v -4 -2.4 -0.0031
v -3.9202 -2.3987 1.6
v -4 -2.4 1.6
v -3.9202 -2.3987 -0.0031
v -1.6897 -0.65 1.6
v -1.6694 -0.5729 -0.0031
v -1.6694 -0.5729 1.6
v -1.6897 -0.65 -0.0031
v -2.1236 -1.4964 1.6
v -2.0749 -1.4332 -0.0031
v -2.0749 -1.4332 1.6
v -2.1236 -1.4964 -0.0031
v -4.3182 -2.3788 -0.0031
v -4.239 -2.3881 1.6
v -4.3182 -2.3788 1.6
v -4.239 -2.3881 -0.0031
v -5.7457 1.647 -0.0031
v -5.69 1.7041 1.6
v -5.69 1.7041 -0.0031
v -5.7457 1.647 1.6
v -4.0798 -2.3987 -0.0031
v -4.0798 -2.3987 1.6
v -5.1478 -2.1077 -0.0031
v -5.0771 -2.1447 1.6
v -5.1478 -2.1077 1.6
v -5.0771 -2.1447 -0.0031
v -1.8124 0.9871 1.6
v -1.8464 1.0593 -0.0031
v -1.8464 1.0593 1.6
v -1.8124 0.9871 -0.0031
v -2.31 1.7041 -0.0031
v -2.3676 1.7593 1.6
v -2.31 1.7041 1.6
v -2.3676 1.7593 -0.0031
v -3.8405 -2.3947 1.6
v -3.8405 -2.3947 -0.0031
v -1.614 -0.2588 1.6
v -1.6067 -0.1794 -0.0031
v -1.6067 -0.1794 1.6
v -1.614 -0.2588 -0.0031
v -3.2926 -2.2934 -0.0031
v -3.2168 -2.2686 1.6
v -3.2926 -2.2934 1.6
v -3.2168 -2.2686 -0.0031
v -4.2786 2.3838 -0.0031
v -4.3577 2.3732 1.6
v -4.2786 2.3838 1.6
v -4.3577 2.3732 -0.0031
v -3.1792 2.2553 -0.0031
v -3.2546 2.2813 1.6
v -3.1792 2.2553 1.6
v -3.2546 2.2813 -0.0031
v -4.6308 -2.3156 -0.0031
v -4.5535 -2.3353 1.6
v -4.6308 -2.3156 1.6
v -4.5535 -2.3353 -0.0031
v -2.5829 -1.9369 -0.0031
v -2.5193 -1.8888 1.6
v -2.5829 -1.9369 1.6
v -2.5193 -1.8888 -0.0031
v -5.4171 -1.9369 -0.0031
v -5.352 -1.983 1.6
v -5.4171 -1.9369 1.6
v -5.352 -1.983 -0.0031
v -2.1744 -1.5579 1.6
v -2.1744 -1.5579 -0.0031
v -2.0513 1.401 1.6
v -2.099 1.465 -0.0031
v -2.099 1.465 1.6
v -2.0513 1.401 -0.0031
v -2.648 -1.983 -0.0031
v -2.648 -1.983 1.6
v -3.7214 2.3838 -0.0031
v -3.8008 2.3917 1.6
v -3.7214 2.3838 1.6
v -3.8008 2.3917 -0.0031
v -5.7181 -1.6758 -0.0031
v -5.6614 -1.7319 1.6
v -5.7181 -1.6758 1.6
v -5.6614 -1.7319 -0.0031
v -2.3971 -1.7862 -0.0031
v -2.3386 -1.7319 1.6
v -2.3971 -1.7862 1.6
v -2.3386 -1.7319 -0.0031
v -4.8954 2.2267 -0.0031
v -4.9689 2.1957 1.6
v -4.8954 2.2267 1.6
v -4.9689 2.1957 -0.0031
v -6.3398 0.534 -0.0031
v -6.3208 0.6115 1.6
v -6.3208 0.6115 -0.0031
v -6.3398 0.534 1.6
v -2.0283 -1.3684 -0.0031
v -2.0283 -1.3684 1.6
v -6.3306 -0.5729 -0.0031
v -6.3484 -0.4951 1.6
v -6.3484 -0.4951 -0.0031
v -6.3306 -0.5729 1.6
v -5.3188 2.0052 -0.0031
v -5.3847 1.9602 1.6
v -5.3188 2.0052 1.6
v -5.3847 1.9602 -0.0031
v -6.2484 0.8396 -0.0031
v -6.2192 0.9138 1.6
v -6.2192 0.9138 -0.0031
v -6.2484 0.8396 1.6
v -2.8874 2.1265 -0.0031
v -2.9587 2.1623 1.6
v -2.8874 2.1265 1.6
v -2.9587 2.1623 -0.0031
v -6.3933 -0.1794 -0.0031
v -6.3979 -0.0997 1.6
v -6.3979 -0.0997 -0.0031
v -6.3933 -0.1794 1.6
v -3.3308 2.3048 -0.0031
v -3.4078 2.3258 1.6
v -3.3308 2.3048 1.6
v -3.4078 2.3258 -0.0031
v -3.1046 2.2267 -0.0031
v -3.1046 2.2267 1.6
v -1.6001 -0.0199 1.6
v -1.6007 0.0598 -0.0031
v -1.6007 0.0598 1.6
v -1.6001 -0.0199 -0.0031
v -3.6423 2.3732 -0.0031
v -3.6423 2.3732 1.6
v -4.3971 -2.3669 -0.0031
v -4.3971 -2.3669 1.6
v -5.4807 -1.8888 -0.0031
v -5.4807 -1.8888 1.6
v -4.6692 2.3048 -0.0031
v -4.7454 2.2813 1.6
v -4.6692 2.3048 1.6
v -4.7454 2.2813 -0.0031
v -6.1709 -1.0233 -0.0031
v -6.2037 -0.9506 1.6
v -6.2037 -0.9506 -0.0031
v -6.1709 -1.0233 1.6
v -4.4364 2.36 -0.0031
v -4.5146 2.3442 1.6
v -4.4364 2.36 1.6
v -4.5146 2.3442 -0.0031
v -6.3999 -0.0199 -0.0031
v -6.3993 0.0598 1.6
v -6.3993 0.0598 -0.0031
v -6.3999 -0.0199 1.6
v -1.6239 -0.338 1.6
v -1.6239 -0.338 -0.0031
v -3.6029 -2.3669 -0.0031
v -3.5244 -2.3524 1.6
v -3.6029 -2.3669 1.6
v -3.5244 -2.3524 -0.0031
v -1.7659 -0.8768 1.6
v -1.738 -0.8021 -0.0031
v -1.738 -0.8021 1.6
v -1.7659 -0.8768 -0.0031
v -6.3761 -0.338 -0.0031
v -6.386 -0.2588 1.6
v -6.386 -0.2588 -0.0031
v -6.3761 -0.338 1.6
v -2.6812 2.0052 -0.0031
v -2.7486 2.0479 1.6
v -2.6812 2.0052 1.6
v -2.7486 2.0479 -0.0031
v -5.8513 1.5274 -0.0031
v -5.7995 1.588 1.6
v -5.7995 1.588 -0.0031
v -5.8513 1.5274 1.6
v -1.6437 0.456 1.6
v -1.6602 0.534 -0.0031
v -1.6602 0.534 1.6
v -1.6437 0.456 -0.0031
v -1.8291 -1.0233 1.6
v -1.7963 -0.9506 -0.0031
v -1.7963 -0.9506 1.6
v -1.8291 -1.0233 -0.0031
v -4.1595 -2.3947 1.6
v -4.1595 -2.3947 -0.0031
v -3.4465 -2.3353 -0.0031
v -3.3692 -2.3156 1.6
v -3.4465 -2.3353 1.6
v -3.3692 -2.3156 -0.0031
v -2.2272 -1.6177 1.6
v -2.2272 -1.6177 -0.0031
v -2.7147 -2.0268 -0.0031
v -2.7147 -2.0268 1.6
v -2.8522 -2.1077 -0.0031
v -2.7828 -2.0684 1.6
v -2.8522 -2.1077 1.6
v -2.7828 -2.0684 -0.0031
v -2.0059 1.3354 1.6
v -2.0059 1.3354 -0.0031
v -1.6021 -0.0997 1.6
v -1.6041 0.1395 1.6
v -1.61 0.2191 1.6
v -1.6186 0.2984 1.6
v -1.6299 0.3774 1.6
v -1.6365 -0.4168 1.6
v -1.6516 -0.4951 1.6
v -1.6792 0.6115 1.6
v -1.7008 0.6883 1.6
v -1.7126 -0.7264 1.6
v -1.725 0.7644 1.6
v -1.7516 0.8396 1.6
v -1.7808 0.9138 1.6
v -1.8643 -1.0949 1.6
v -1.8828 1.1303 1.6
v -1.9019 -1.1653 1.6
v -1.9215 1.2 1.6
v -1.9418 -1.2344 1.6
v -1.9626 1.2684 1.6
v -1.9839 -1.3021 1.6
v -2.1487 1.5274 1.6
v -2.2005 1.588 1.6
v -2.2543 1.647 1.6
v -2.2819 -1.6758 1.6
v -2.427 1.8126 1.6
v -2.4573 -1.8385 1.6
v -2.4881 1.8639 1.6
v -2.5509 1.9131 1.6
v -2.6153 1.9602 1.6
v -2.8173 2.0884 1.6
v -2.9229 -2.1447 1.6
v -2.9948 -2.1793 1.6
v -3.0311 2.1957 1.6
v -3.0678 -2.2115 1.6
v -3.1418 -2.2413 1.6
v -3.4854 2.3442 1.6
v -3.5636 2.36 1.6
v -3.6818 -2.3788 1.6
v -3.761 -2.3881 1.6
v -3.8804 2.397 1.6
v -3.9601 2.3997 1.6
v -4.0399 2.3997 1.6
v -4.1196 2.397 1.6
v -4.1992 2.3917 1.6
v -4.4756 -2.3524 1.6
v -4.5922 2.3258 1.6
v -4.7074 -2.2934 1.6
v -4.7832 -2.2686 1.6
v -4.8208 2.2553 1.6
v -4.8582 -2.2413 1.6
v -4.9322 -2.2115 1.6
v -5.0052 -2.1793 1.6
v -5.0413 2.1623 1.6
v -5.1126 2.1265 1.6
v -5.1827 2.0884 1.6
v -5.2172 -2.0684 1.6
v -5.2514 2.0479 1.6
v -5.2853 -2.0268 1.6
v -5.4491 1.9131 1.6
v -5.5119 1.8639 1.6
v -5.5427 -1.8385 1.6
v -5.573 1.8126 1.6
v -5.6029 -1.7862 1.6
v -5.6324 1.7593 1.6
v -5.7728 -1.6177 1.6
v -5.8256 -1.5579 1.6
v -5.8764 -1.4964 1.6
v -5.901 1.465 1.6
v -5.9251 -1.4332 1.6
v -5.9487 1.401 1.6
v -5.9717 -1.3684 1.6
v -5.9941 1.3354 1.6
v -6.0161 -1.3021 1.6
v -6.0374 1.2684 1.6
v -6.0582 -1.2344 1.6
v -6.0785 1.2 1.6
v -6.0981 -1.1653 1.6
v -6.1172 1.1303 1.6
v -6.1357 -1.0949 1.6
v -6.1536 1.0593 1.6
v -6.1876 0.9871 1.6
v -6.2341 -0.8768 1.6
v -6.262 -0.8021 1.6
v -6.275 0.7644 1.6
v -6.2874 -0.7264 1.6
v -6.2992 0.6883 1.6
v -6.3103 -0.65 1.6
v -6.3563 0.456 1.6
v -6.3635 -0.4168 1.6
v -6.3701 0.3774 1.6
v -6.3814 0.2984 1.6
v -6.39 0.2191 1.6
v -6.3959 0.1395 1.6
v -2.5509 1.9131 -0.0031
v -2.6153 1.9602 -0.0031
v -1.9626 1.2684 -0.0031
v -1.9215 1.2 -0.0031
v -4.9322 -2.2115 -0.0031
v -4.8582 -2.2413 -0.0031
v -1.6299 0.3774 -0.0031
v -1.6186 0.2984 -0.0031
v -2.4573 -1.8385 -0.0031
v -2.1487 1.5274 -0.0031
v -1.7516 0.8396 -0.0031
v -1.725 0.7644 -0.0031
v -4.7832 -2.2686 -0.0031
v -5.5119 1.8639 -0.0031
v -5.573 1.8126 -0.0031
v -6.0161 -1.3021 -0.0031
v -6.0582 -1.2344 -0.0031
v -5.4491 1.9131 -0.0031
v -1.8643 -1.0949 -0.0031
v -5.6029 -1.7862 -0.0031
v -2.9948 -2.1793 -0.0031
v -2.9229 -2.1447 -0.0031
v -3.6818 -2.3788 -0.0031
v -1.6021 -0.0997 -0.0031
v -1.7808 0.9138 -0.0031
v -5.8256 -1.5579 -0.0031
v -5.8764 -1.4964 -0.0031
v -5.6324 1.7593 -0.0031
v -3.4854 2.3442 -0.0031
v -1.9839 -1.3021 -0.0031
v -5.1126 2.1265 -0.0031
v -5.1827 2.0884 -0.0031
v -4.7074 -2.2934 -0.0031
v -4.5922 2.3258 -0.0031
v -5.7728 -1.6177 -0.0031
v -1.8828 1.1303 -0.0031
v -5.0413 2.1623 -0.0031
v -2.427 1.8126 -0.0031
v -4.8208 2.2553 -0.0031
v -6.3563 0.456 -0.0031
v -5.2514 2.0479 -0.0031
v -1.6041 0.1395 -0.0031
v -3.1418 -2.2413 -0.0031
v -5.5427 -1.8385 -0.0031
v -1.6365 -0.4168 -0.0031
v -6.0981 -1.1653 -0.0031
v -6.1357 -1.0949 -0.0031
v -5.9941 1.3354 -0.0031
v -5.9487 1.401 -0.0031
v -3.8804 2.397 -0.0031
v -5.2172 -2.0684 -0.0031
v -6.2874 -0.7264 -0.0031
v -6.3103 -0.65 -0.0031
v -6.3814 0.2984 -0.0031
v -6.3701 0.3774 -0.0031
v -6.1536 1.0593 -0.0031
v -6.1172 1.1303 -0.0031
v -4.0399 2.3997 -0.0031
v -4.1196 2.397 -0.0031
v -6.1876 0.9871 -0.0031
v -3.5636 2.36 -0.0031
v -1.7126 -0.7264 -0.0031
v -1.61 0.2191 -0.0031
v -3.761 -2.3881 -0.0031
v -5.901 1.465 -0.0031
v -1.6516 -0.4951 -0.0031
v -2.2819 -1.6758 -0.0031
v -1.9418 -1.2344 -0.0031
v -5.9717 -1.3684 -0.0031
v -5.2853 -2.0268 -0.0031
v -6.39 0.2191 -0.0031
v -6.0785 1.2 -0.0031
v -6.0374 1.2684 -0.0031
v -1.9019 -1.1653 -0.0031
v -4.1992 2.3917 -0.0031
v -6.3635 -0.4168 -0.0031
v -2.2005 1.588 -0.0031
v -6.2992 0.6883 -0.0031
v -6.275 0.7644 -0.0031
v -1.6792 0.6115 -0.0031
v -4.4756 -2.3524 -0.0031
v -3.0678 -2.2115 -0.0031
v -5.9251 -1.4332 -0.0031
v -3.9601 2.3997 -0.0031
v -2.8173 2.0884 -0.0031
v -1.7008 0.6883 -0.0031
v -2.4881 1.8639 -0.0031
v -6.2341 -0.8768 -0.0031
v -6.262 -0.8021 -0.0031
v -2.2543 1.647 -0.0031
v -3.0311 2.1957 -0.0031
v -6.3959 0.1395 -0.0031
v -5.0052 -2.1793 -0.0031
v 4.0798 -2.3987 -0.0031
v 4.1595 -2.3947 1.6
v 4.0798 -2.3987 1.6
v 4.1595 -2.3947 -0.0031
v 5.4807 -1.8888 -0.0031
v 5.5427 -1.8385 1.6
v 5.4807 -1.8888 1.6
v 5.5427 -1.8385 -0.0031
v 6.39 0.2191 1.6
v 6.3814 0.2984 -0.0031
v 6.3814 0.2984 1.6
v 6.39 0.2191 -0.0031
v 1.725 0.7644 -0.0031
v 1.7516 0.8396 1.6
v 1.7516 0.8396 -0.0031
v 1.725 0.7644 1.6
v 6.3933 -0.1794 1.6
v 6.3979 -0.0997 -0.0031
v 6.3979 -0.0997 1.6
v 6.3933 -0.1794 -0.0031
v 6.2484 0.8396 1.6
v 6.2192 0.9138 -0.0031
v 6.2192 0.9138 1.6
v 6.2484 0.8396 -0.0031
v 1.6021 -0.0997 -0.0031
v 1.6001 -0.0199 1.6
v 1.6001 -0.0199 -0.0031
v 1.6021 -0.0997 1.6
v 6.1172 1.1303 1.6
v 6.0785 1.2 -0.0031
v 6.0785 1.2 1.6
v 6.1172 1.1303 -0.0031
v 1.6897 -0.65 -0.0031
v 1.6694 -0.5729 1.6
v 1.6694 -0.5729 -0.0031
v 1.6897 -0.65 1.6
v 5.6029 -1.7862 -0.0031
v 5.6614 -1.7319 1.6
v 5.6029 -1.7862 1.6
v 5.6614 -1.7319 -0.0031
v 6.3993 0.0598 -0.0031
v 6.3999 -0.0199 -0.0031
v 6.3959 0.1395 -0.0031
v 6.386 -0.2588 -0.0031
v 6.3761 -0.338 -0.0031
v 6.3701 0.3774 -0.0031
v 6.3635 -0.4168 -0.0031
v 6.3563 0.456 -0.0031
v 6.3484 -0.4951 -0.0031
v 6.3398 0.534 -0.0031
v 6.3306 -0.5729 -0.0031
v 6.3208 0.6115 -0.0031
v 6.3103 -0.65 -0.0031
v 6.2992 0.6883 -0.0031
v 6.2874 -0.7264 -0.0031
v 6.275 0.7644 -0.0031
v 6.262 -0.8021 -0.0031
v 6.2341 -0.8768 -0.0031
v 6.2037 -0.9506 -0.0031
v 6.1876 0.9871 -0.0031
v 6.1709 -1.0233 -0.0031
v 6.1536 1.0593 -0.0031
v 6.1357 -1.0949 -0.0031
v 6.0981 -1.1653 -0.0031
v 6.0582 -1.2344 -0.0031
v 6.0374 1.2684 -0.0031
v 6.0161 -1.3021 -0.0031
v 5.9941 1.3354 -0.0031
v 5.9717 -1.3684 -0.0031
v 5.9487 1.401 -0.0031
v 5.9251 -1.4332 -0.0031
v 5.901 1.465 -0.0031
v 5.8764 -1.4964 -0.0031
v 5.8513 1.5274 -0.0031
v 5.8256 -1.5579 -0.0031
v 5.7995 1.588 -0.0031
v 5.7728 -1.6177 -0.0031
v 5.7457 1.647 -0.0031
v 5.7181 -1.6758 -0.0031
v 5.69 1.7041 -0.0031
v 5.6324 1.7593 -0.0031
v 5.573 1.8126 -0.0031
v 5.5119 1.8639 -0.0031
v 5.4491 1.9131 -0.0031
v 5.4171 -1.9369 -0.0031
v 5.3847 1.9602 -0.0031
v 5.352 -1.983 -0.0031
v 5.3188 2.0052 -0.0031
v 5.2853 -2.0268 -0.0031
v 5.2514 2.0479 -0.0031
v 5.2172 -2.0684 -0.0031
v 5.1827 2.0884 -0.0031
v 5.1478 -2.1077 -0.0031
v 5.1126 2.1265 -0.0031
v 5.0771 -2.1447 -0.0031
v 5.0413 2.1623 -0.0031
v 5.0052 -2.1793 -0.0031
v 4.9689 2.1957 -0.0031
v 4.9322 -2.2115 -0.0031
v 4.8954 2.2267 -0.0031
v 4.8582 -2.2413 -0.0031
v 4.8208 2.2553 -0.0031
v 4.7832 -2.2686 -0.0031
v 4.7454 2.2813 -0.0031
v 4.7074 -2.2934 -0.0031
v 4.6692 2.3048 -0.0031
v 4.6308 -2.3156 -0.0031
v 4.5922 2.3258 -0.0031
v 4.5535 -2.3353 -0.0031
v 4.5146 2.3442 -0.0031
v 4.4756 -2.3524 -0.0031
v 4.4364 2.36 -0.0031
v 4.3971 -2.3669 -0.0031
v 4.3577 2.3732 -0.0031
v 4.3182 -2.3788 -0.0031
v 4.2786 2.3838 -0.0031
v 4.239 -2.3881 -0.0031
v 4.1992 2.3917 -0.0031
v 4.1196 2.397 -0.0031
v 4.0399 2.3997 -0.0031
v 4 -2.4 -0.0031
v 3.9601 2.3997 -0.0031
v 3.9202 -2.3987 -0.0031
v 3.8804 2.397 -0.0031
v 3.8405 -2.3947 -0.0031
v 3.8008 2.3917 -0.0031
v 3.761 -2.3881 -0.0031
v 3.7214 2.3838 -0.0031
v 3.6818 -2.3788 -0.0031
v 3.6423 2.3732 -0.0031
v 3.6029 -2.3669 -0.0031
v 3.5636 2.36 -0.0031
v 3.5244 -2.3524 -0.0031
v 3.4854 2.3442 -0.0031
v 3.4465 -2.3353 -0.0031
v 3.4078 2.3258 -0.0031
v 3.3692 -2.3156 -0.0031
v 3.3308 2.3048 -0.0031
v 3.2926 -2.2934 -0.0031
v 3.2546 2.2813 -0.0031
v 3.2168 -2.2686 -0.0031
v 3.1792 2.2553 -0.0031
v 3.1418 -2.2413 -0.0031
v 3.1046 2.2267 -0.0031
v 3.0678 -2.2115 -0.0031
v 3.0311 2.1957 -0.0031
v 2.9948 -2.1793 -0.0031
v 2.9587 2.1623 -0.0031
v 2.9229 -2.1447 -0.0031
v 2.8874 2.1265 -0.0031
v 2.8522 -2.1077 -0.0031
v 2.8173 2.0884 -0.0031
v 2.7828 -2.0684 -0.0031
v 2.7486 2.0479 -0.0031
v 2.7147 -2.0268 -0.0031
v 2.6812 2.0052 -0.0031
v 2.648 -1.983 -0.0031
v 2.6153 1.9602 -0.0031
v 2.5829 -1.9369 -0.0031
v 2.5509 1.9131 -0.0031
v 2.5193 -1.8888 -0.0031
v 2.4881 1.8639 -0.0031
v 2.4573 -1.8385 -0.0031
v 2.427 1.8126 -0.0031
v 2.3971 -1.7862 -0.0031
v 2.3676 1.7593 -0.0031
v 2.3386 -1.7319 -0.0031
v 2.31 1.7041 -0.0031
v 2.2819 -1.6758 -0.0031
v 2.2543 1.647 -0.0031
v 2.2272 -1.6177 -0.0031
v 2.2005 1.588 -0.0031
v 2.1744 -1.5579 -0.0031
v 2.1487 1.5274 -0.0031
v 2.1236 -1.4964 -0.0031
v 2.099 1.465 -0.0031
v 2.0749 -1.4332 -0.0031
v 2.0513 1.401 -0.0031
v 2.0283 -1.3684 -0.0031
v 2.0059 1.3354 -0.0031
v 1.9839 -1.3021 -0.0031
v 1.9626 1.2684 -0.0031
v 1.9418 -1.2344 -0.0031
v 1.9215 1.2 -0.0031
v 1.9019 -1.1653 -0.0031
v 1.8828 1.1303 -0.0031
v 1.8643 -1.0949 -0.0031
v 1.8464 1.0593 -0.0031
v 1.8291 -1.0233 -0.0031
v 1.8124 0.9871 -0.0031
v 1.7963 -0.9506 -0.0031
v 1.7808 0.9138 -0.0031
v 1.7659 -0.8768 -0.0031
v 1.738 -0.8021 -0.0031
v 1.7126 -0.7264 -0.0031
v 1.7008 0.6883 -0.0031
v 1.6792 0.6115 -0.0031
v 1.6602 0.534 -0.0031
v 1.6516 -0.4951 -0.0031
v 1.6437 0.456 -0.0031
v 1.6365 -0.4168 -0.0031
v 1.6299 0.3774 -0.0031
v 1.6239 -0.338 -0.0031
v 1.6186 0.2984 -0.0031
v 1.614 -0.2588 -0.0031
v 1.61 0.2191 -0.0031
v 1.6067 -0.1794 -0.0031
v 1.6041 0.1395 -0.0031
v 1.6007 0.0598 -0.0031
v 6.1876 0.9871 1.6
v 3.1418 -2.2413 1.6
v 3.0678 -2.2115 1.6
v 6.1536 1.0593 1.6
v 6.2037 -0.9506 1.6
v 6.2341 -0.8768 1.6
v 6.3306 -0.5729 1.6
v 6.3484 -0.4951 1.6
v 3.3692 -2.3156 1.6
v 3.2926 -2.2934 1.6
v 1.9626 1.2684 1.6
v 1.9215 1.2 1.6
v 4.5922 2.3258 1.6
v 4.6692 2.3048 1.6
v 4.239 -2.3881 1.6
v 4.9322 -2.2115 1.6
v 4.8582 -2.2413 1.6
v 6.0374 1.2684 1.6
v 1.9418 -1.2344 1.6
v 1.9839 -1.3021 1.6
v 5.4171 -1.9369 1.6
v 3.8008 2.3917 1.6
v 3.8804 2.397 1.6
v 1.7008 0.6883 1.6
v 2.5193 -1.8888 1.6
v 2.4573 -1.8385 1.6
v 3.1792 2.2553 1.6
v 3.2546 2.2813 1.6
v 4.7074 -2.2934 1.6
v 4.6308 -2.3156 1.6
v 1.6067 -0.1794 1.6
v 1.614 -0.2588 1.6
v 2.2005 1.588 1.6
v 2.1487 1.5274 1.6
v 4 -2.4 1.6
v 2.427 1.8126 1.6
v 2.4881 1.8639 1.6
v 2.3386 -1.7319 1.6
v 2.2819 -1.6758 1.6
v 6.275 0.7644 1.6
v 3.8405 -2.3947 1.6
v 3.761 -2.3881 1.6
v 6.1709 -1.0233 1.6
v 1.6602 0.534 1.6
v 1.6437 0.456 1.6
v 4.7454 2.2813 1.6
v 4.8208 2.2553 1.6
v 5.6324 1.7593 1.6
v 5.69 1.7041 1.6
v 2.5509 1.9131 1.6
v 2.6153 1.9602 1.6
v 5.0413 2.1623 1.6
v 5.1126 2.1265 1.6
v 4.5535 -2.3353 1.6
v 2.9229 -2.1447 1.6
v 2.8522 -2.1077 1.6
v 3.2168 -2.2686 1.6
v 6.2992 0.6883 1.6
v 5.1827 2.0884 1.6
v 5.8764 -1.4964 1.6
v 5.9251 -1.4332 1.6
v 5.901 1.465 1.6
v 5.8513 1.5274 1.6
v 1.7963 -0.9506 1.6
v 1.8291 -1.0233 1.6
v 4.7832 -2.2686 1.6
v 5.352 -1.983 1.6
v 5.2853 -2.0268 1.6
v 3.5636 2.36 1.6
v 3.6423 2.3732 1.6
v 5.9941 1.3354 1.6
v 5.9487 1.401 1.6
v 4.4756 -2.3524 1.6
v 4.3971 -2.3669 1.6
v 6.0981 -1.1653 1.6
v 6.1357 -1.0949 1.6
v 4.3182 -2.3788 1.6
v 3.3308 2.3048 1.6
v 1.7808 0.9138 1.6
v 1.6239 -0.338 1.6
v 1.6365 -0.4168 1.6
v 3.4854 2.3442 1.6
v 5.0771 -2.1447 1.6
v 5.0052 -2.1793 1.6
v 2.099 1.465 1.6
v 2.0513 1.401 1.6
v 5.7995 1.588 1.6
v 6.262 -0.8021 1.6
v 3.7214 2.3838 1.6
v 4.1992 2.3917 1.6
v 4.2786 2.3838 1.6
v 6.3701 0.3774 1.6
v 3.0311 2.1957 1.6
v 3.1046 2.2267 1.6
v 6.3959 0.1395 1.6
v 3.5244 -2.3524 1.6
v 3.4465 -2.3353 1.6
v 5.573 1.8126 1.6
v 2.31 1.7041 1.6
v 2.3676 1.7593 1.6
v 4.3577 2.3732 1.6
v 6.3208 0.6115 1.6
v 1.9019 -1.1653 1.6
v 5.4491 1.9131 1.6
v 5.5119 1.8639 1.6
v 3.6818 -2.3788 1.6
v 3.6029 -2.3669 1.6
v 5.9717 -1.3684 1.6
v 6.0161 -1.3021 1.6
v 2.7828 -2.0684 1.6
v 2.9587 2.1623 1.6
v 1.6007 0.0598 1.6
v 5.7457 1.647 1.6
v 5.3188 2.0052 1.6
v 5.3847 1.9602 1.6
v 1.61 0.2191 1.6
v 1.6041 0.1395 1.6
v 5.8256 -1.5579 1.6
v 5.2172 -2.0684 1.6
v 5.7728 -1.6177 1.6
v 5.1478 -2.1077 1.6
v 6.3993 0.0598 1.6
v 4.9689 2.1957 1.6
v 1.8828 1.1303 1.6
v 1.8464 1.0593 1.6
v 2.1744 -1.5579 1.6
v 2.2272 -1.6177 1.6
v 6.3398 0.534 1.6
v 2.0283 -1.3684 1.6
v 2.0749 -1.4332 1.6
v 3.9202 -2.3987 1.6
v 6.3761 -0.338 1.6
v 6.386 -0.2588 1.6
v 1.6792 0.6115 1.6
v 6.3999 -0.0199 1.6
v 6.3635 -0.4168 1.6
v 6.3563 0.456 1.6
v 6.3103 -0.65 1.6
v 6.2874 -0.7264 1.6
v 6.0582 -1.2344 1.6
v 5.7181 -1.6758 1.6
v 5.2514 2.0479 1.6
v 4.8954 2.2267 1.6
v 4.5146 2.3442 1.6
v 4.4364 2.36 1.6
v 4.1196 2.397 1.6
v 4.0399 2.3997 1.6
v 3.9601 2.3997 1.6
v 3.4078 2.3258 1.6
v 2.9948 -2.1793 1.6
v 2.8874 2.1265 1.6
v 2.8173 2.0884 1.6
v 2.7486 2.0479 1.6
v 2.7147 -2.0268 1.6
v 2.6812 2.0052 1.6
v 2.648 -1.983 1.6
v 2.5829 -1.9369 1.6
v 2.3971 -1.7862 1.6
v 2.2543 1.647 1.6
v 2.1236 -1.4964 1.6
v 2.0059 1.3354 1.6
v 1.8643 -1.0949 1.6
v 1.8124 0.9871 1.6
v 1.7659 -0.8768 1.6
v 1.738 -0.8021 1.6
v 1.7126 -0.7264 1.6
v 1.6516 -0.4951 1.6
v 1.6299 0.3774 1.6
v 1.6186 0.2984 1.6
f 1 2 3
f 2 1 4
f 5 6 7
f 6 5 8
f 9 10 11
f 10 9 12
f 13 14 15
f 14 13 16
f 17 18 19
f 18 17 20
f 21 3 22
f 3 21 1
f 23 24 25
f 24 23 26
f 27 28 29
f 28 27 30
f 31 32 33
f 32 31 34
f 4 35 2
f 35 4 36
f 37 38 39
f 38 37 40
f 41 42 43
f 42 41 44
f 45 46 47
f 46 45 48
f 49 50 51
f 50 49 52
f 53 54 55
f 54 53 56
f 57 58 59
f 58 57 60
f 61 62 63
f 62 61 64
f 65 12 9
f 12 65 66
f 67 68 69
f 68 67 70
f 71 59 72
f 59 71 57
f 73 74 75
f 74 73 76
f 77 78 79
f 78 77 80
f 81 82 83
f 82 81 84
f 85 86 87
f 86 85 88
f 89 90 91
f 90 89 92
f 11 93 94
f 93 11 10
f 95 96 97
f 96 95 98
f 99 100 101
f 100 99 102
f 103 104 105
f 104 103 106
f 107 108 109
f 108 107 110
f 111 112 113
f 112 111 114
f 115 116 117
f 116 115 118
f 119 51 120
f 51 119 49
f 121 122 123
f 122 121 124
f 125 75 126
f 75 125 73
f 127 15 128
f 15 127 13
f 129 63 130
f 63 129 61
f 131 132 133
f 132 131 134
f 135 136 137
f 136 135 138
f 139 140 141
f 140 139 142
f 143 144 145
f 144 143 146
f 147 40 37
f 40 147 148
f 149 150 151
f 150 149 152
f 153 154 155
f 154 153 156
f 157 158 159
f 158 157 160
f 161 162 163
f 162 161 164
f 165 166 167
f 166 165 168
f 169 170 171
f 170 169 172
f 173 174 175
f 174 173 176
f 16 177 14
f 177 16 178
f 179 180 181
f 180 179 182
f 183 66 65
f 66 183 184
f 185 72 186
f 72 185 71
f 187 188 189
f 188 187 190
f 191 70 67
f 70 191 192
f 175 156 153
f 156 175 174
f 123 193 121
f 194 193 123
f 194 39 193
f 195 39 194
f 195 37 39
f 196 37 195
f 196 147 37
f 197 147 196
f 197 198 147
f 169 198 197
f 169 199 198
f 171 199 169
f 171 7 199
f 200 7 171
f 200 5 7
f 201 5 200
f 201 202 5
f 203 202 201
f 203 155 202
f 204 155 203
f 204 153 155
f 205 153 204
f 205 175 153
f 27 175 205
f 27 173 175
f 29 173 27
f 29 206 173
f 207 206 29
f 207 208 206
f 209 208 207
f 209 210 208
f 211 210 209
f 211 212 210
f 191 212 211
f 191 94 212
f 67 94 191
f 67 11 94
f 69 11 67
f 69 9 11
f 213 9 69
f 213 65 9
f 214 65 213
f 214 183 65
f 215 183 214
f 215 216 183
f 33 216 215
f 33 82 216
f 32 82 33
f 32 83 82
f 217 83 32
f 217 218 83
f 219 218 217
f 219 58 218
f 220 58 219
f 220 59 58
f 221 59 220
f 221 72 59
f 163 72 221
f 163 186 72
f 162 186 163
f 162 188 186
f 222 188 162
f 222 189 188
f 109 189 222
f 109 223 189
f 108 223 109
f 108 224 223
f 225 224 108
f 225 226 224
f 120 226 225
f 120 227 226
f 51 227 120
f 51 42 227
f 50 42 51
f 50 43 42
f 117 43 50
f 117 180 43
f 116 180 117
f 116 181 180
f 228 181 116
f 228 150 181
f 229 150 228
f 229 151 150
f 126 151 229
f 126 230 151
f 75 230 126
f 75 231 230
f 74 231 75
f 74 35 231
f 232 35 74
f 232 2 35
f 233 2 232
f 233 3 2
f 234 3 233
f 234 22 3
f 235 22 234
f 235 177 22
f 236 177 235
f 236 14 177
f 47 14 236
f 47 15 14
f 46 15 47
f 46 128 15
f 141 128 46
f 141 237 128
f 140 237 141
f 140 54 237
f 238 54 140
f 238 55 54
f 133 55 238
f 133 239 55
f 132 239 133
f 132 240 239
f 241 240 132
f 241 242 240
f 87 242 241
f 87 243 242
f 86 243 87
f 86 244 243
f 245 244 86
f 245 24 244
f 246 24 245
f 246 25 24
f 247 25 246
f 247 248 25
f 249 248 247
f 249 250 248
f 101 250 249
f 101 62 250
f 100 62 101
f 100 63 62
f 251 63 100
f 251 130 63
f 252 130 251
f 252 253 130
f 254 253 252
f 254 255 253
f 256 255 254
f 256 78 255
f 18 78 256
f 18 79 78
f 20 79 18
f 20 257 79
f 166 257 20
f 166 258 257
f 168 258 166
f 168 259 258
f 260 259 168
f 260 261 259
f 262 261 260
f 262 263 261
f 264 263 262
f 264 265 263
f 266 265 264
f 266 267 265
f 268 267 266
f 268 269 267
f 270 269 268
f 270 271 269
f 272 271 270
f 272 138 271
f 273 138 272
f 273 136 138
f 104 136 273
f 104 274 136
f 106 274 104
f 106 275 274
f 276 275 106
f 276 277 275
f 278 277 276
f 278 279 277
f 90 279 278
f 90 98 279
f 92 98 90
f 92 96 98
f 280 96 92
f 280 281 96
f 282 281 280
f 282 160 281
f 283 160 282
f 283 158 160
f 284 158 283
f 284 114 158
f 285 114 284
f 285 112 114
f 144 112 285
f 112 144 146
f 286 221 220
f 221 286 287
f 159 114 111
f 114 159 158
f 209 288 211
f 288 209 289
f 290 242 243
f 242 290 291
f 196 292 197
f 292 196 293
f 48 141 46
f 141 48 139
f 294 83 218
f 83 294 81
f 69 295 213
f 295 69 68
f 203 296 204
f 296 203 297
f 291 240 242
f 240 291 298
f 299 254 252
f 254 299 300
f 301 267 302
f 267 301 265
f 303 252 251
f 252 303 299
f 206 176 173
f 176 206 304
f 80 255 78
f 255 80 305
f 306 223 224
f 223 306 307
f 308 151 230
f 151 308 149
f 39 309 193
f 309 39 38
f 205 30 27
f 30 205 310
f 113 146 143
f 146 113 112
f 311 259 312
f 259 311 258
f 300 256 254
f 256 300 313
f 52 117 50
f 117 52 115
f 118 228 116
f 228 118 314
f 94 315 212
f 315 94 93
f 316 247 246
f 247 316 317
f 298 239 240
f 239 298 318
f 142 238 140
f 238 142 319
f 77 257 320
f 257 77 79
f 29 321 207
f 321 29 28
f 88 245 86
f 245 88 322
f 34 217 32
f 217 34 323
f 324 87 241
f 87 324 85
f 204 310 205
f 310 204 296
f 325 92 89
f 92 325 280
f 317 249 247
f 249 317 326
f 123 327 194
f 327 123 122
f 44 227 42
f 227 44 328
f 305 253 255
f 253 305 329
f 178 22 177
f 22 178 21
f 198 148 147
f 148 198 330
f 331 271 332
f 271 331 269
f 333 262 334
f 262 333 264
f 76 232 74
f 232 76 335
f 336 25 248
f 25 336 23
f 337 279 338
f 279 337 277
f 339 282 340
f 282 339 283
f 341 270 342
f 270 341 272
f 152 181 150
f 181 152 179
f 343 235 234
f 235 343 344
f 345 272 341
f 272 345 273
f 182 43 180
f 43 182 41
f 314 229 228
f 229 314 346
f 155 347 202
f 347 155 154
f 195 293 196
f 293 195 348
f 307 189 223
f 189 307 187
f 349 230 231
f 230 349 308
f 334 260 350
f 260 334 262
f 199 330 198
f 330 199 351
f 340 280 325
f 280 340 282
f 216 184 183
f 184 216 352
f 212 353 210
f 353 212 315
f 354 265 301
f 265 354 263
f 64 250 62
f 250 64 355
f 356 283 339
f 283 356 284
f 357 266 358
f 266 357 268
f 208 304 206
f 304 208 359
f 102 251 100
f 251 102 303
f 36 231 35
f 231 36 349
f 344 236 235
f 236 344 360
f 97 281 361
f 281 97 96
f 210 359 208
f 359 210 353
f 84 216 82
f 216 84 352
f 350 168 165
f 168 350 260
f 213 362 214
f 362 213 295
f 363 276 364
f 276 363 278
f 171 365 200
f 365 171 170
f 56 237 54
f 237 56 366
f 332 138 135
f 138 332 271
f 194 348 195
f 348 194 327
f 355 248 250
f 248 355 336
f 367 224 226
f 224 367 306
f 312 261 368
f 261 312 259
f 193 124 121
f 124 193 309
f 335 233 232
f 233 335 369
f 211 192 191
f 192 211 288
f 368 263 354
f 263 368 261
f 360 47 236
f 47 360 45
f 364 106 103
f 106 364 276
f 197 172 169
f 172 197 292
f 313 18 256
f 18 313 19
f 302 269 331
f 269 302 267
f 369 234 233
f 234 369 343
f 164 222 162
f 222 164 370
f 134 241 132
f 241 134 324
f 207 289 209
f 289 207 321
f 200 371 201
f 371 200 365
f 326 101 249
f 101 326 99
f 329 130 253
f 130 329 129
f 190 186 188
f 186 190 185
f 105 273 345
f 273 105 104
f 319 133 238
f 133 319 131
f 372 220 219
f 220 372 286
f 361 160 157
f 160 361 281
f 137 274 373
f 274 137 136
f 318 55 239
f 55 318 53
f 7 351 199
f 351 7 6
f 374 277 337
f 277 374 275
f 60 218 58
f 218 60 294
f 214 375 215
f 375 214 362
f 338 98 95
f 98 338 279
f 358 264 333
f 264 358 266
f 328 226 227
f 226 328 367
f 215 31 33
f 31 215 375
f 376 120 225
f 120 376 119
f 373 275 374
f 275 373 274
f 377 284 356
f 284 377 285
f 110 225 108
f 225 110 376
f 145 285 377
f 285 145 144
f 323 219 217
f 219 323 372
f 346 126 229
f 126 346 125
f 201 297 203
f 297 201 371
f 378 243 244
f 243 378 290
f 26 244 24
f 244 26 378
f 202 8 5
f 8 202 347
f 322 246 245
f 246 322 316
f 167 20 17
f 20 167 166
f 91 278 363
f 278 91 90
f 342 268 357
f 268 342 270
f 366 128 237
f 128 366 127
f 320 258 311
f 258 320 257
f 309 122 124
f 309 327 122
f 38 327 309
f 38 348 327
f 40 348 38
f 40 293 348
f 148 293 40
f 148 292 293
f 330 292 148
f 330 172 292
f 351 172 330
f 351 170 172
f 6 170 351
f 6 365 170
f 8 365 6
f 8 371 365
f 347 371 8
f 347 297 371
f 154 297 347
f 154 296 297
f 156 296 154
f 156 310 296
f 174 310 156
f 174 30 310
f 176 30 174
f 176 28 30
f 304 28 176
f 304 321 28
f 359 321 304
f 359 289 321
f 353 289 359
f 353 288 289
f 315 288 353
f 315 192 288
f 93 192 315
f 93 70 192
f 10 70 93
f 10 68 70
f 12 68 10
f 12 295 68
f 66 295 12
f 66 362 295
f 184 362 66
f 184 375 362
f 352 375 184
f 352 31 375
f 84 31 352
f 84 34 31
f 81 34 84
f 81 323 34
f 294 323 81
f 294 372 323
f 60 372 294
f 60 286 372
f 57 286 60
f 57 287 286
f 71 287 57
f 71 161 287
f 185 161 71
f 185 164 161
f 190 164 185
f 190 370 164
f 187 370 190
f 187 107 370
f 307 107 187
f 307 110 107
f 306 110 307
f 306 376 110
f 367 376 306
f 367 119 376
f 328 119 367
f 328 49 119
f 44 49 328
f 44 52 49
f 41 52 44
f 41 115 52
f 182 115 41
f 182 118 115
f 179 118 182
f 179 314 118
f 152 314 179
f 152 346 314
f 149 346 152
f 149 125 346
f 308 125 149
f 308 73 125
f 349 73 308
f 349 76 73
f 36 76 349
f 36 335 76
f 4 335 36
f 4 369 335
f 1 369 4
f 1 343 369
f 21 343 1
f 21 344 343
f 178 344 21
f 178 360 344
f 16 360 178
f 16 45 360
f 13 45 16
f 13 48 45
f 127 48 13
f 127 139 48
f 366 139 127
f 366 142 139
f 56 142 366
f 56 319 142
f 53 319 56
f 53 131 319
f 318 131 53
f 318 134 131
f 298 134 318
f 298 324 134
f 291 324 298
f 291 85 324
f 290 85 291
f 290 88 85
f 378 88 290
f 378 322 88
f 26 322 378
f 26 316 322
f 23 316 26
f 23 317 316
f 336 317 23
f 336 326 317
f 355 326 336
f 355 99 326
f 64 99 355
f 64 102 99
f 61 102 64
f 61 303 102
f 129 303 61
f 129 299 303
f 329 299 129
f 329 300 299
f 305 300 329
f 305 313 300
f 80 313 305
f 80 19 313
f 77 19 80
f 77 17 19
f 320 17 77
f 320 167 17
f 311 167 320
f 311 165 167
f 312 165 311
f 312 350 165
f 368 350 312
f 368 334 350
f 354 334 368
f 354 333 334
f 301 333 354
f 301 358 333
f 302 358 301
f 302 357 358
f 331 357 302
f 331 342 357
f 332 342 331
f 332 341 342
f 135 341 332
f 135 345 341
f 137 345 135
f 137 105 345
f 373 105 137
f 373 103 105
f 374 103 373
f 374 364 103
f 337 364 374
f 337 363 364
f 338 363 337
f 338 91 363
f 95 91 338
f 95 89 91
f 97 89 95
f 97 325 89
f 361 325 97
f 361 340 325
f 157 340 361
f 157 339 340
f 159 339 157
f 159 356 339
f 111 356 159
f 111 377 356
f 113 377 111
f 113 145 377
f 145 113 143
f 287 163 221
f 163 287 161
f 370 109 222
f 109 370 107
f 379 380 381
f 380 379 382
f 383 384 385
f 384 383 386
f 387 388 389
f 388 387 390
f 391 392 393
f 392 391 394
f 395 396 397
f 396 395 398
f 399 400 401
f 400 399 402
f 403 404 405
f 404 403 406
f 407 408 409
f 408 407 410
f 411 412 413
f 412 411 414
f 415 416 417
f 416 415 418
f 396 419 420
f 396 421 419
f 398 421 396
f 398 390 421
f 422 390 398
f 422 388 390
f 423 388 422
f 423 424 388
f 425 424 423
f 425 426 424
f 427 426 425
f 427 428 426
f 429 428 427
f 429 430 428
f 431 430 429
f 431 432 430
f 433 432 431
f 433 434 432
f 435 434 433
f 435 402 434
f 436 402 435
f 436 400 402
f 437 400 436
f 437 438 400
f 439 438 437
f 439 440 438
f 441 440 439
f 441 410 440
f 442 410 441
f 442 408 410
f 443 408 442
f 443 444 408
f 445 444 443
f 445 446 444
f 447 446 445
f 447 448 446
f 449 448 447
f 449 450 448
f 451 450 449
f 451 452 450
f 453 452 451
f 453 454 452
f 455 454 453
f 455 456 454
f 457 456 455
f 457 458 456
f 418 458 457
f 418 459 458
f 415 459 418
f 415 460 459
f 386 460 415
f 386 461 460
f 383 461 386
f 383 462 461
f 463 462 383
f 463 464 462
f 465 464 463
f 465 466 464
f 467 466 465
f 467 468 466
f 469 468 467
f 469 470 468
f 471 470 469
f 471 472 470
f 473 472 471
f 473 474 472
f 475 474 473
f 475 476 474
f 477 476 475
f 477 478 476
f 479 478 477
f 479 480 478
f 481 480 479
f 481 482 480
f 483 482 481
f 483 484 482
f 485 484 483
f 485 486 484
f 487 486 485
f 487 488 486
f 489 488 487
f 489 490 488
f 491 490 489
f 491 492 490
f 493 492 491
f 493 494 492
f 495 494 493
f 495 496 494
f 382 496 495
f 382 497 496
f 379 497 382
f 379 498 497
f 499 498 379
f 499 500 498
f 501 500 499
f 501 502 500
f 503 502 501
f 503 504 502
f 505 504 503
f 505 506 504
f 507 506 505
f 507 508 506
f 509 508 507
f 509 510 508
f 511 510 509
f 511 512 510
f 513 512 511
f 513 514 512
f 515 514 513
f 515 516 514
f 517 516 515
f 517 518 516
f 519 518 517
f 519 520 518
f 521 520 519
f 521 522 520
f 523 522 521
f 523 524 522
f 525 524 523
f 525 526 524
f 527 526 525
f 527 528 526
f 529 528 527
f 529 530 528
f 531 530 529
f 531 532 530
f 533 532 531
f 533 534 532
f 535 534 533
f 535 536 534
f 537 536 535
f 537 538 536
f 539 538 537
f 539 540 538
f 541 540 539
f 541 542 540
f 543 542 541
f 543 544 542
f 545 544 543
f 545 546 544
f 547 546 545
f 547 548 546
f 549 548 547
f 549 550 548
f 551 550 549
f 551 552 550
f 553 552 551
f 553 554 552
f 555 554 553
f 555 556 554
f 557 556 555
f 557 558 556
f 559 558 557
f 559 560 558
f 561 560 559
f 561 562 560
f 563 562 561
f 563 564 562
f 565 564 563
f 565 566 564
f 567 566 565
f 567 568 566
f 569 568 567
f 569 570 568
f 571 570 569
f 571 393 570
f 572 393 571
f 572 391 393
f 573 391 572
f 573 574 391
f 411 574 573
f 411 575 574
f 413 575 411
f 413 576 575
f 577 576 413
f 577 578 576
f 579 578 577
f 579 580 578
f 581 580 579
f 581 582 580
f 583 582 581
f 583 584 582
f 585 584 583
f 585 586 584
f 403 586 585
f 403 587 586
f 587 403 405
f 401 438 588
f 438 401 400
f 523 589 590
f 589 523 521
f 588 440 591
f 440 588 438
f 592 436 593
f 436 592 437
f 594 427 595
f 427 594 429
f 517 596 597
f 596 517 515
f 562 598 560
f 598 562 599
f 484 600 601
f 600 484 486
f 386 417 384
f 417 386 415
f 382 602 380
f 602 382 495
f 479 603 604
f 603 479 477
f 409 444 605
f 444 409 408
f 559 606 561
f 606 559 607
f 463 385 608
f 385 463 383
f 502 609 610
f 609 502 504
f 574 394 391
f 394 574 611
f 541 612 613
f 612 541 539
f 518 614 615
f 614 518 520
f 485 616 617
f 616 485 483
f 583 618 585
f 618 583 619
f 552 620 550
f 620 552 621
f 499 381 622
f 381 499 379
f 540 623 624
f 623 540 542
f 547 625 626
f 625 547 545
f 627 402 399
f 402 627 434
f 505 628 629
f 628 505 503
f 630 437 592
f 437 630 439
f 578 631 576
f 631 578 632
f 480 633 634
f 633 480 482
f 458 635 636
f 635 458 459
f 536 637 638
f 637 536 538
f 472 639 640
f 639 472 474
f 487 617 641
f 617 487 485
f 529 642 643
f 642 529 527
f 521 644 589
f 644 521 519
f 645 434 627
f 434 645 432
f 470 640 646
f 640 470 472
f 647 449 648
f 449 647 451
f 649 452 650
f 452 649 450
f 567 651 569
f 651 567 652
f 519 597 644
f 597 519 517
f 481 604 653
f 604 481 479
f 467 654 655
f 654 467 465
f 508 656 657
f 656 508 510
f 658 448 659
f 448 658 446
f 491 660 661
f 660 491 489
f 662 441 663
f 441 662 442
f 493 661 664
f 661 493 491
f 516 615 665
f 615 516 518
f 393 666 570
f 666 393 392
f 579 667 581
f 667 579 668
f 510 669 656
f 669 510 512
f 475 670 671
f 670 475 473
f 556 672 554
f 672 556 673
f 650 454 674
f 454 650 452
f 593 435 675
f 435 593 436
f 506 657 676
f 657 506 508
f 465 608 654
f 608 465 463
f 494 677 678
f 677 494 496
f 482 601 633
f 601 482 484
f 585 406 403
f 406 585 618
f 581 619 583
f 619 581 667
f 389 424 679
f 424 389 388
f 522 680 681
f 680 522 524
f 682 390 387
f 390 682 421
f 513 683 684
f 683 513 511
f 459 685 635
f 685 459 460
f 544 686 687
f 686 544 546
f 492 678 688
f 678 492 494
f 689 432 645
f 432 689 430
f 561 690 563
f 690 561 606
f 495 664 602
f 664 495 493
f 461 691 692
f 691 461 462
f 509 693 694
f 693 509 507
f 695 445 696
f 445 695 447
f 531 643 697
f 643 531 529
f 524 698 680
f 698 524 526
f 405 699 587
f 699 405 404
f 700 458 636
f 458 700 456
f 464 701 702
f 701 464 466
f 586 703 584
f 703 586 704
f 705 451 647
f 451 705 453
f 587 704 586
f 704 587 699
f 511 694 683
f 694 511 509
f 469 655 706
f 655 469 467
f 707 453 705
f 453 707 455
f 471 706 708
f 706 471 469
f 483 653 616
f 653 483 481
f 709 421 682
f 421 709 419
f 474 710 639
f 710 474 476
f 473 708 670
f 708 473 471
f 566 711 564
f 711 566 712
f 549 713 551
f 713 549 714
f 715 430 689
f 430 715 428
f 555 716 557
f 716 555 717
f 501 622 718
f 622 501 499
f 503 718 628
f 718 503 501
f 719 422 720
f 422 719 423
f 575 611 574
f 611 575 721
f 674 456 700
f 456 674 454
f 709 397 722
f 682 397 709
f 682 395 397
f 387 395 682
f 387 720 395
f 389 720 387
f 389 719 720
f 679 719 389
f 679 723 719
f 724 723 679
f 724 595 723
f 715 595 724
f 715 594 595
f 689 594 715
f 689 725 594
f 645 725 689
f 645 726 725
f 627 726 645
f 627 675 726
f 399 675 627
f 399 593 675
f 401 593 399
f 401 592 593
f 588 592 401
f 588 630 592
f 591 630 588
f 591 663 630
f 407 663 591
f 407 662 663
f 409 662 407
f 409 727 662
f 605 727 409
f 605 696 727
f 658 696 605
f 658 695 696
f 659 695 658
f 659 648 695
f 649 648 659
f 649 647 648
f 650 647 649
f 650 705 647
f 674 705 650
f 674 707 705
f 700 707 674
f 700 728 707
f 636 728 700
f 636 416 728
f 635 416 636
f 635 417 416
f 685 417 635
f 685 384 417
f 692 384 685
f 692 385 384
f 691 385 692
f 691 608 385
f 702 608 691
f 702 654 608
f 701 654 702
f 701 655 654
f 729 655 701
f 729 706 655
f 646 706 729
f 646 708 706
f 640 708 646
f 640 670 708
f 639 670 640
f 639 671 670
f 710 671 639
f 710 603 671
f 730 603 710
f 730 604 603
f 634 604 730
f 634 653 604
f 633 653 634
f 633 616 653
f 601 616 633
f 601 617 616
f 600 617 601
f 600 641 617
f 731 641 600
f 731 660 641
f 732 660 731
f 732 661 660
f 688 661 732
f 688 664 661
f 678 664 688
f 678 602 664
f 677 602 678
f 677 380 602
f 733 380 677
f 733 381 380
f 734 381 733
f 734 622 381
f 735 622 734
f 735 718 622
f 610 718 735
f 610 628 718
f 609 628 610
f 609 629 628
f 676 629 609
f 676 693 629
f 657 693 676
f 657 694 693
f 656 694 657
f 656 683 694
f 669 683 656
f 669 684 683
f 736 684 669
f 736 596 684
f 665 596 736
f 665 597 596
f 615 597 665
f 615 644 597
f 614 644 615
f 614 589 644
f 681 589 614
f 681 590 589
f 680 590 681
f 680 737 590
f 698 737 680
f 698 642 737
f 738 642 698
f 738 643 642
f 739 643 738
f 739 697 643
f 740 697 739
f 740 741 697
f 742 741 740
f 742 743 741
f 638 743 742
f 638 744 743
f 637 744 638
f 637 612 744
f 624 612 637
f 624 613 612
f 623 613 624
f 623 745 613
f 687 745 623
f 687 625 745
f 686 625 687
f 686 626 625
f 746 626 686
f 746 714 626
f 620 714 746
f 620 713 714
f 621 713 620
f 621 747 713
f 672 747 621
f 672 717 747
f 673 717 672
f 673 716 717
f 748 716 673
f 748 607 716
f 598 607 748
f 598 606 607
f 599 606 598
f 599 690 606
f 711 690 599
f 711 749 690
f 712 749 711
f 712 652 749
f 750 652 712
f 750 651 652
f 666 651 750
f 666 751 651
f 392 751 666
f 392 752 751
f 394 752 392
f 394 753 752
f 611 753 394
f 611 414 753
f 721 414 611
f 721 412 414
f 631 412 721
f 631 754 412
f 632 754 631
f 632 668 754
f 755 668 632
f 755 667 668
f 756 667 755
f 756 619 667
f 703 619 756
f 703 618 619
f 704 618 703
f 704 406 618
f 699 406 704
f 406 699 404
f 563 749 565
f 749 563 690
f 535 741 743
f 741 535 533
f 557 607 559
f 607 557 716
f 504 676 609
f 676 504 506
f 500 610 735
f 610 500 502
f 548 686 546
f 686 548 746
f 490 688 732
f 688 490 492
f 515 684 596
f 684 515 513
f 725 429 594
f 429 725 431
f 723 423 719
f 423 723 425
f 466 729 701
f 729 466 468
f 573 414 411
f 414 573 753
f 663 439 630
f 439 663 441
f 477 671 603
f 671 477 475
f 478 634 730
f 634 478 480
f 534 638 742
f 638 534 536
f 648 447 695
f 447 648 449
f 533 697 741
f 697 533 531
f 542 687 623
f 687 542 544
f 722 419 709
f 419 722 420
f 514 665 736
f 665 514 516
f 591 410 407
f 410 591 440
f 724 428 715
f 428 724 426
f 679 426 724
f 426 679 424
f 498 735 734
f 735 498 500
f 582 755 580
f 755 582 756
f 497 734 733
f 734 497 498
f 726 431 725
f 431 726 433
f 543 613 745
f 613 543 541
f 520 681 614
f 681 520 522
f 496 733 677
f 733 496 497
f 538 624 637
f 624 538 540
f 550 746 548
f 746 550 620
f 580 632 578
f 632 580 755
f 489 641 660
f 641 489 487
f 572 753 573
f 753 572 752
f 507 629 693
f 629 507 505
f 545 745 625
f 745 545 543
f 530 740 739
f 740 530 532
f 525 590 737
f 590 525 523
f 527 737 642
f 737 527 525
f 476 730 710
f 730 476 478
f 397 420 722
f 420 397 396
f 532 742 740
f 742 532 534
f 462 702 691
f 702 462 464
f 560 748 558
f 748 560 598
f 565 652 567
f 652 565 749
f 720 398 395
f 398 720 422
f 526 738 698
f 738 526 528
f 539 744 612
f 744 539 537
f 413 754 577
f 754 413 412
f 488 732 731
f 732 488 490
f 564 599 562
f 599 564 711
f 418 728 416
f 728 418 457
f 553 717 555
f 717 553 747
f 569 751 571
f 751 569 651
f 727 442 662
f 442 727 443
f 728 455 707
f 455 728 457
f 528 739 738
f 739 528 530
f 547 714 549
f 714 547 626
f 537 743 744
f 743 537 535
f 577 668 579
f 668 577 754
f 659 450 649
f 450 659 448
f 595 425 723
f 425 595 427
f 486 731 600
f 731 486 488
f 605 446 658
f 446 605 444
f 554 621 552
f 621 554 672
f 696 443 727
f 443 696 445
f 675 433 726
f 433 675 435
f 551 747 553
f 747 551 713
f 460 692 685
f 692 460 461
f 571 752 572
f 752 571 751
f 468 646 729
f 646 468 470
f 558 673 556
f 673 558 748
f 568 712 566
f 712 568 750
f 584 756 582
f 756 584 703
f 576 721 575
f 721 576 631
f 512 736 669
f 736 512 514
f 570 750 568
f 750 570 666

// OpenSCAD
use <../lib.scad>
use <s/3298s01.scad>
$fa=1; $fs=0.2;
function ldraw_lib__3298p11(realsolid=false) = [
// 0 Slope Brick 33  3 x  2 with Red on Yellow Triangles Pattern
// 0 Name: 3298p11.dat
// 0 Author: Tore Eriksson [Tore_Eriksson]
// 0 !LDRAW_ORG Part UPDATE 2009-03
// 0 !LICENSE Licensed under CC BY 2.0 and CC BY 4.0 : see CAreadme.txt
// 
// 0 BFC CERTIFY CCW
  [0,"BFC","CERTIFY"],
  [0,"BFC","CCW"],
// 
// 0 !HISTORY 2009-12-29 [PTadmin] Official Update 2009-03
// 
// 
// 1 16 0 0 0 1 0 0 0 1 0 0 0 1 s\3298s01.dat
  [1,16,0,0,0,1,0,0,0,1,0,0,0,1, ldraw_lib__s__3298s01(realsolid)],
// 
// 3 16 20 20 -50 20 0 -10 16 1 -12
  [3,16,20,20,-50,20,0,-10,16,1,-12],
// 3 16 20 20 -50 16 1 -12 10 20 -50
  [3,16,20,20,-50,16,1,-12,10,20,-50],
// 4 16 10 20 -50 4 1 -12 -4 1 -12 -10 20 -50
  [4,16,10,20,-50,4,1,-12,-4,1,-12,-10,20,-50],
// 3 16 -10 20 -50 -16 1 -12 -20 0 -10
  [3,16,-10,20,-50,-16,1,-12,-20,0,-10],
// 3 16 -10 20 -50 -20 0 -10 -20 20 -50
  [3,16,-10,20,-50,-20,0,-10,-20,20,-50],
// 4 16 20 0 -10 -20 0 -10 -16 1 -12 16 1 -12
  [4,16,20,0,-10,-20,0,-10,-16,1,-12,16,1,-12],
// 0
// 4 14 -4 1 -12 -16 1 -12 -15.3 1.35 -12.7 -4.7 1.35 -12.7
  [4,14,-4,1,-12,-16,1,-12,-15.3,1.35,-12.7,-4.7,1.35,-12.7],
// 4 14 -4 1 -12 -4.7 1.35 -12.7 -10 17 -44 -10 20 -50
  [4,14,-4,1,-12,-4.7,1.35,-12.7,-10,17,-44,-10,20,-50],
// 4 14 -16 1 -12 -10 20 -50 -10 17 -44 -15.3 1.35 -12.7
  [4,14,-16,1,-12,-10,20,-50,-10,17,-44,-15.3,1.35,-12.7],
// 0
// 4 14 16 1 -12 4 1 -12 4.7 1.35 -12.7 15.3 1.35 -12.7
  [4,14,16,1,-12,4,1,-12,4.7,1.35,-12.7,15.3,1.35,-12.7],
// 4 14 16 1 -12 15.3 1.35 -12.7 10 17 -44 10 20 -50
  [4,14,16,1,-12,15.3,1.35,-12.7,10,17,-44,10,20,-50],
// 4 14 4 1 -12 10 20 -50 10 17 -44 4.7 1.35 -12.7
  [4,14,4,1,-12,10,20,-50,10,17,-44,4.7,1.35,-12.7],
// 0
// 3 4 -4.7 1.35 -12.7 -15.3 1.35 -12.7 -10 17 -44
  [3,4,-4.7,1.35,-12.7,-15.3,1.35,-12.7,-10,17,-44],
// 0
// 3 4 15.3 1.35 -12.7 4.7 1.35 -12.7 10 17 -44
  [3,4,15.3,1.35,-12.7,4.7,1.35,-12.7,10,17,-44],
// 0
];
module ldraw_lib__3298p11(step=0, col=false, unit=2/5, alt=false, line=0.2, solid=!$preview)
    makepoly(ldraw_lib__3298p11(solid), step=step, col=col, unit=unit, alt=alt, line=line, solid=solid);
ldraw_lib__3298p11(line=0.2);
